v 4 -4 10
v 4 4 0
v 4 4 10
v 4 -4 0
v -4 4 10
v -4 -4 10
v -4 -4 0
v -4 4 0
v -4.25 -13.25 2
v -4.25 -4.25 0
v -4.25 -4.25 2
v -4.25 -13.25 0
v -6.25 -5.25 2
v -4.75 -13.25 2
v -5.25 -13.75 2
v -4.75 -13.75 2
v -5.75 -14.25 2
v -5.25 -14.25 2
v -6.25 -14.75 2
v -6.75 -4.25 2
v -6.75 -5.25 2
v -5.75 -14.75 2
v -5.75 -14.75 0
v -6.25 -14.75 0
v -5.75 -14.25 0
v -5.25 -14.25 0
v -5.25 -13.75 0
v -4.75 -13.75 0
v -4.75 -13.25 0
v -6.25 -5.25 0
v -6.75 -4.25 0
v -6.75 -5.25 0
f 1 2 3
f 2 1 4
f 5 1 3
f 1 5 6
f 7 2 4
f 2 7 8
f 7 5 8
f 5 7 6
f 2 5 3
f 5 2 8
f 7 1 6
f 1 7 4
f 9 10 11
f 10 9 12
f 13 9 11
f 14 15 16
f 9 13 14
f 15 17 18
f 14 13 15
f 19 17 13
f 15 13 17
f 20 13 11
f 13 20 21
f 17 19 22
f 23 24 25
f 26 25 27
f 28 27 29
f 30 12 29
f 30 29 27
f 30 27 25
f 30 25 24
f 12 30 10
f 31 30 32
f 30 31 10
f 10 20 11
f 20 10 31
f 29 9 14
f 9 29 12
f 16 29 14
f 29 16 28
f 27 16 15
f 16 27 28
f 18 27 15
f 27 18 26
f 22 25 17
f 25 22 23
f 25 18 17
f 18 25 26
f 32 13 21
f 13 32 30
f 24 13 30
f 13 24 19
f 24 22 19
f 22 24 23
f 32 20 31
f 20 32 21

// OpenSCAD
translate([0, 0, 5]) color([0,1,0,0.9]) cube([8, 8, 10], center=true);
translate([-4.5, -4.5, 1]) color([1,0,0]) cube([0.5, 0.5, 2], center=true);
translate([-4.5, -5.0, 1]) color([1,0,0]) cube([0.5, 0.5, 2], center=true);
translate([-4.5, -5.5, 1]) color([1,0,0]) cube([0.5, 0.5, 2], center=true);
translate([-4.5, -6.0, 1]) color([1,0,0]) cube([0.5, 0.5, 2], center=true);
translate([-4.5, -6.5, 1]) color([1,0,0]) cube([0.5, 0.5, 2], center=true);
translate([-4.5, -7.0, 1]) color([1,0,0]) cube([0.5, 0.5, 2], center=true);
translate([-4.5, -7.5, 1]) color([1,0,0]) cube([0.5, 0.5, 2], center=true);
translate([-4.5, -8.0, 1]) color([1,0,0]) cube([0.5, 0.5, 2], center=true);
translate([-4.5, -8.5, 1]) color([1,0,0]) cube([0.5, 0.5, 2], center=true);
translate([-4.5, -9.0, 1]) color([1,0,0]) cube([0.5, 0.5, 2], center=true);
translate([-4.5, -9.5, 1]) color([1,0,0]) cube([0.5, 0.5, 2], center=true);
translate([-4.5, -10.0, 1]) color([1,0,0]) cube([0.5, 0.5, 2], center=true);
translate([-4.5, -10.5, 1]) color([1,0,0]) cube([0.5, 0.5, 2], center=true);
translate([-4.5, -11.0, 1]) color([1,0,0]) cube([0.5, 0.5, 2], center=true);
translate([-4.5, -11.5, 1]) color([1,0,0]) cube([0.5, 0.5, 2], center=true);
translate([-4.5, -12.0, 1]) color([1,0,0]) cube([0.5, 0.5, 2], center=true);
translate([-4.5, -12.5, 1]) color([1,0,0]) cube([0.5, 0.5, 2], center=true);
translate([-4.5, -13.0, 1]) color([1,0,0]) cube([0.5, 0.5, 2], center=true);
translate([-5.0, -4.5, 1]) color([1,0,0]) cube([0.5, 0.5, 2], center=true);
translate([-5.0, -5.0, 1]) color([1,0,0]) cube([0.5, 0.5, 2], center=true);
translate([-5.0, -5.5, 1]) color([1,0,0]) cube([0.5, 0.5, 2], center=true);
translate([-5.0, -6.0, 1]) color([1,0,0]) cube([0.5, 0.5, 2], center=true);
translate([-5.0, -6.5, 1]) color([1,0,0]) cube([0.5, 0.5, 2], center=true);
translate([-5.0, -7.0, 1]) color([1,0,0]) cube([0.5, 0.5, 2], center=true);
translate([-5.0, -7.5, 1]) color([1,0,0]) cube([0.5, 0.5, 2], center=true);
translate([-5.0, -8.0, 1]) color([1,0,0]) cube([0.5, 0.5, 2], center=true);
translate([-5.0, -8.5, 1]) color([1,0,0]) cube([0.5, 0.5, 2], center=true);
translate([-5.0, -9.0, 1]) color([1,0,0]) cube([0.5, 0.5, 2], center=true);
translate([-5.0, -9.5, 1]) color([1,0,0]) cube([0.5, 0.5, 2], center=true);
translate([-5.0, -10.0, 1]) color([1,0,0]) cube([0.5, 0.5, 2], center=true);
translate([-5.0, -10.5, 1]) color([1,0,0]) cube([0.5, 0.5, 2], center=true);
translate([-5.0, -11.0, 1]) color([1,0,0]) cube([0.5, 0.5, 2], center=true);
translate([-5.0, -11.5, 1]) color([1,0,0]) cube([0.5, 0.5, 2], center=true);
translate([-5.0, -12.0, 1]) color([1,0,0]) cube([0.5, 0.5, 2], center=true);
translate([-5.0, -12.5, 1]) color([1,0,0]) cube([0.5, 0.5, 2], center=true);
translate([-5.0, -13.0, 1]) color([1,0,0]) cube([0.5, 0.5, 2], center=true);
translate([-5.0, -13.5, 1]) color([1,0,0]) cube([0.5, 0.5, 2], center=true);
translate([-5.5, -4.5, 1]) color([1,0,0]) cube([0.5, 0.5, 2], center=true);
translate([-5.5, -5.0, 1]) color([1,0,0]) cube([0.5, 0.5, 2], center=true);
translate([-5.5, -5.5, 1]) color([1,0,0]) cube([0.5, 0.5, 2], center=true);
translate([-5.5, -6.0, 1]) color([1,0,0]) cube([0.5, 0.5, 2], center=true);
translate([-5.5, -6.5, 1]) color([1,0,0]) cube([0.5, 0.5, 2], center=true);
translate([-5.5, -7.0, 1]) color([1,0,0]) cube([0.5, 0.5, 2], center=true);
translate([-5.5, -7.5, 1]) color([1,0,0]) cube([0.5, 0.5, 2], center=true);
translate([-5.5, -8.0, 1]) color([1,0,0]) cube([0.5, 0.5, 2], center=true);
translate([-5.5, -8.5, 1]) color([1,0,0]) cube([0.5, 0.5, 2], center=true);
translate([-5.5, -9.0, 1]) color([1,0,0]) cube([0.5, 0.5, 2], center=true);
translate([-5.5, -9.5, 1]) color([1,0,0]) cube([0.5, 0.5, 2], center=true);
translate([-5.5, -10.0, 1]) color([1,0,0]) cube([0.5, 0.5, 2], center=true);
translate([-5.5, -10.5, 1]) color([1,0,0]) cube([0.5, 0.5, 2], center=true);
translate([-5.5, -11.0, 1]) color([1,0,0]) cube([0.5, 0.5, 2], center=true);
translate([-5.5, -11.5, 1]) color([1,0,0]) cube([0.5, 0.5, 2], center=true);
translate([-5.5, -12.0, 1]) color([1,0,0]) cube([0.5, 0.5, 2], center=true);
translate([-5.5, -12.5, 1]) color([1,0,0]) cube([0.5, 0.5, 2], center=true);
translate([-5.5, -13.0, 1]) color([1,0,0]) cube([0.5, 0.5, 2], center=true);
translate([-5.5, -13.5, 1]) color([1,0,0]) cube([0.5, 0.5, 2], center=true);
translate([-5.5, -14.0, 1]) color([1,0,0]) cube([0.5, 0.5, 2], center=true);
translate([-6.0, -4.5, 1]) color([1,0,0]) cube([0.5, 0.5, 2], center=true);
translate([-6.0, -5.0, 1]) color([1,0,0]) cube([0.5, 0.5, 2], center=true);
translate([-6.0, -5.5, 1]) color([1,0,0]) cube([0.5, 0.5, 2], center=true);
translate([-6.0, -6.0, 1]) color([1,0,0]) cube([0.5, 0.5, 2], center=true);
translate([-6.0, -6.5, 1]) color([1,0,0]) cube([0.5, 0.5, 2], center=true);
translate([-6.0, -7.0, 1]) color([1,0,0]) cube([0.5, 0.5, 2], center=true);
translate([-6.0, -7.5, 1]) color([1,0,0]) cube([0.5, 0.5, 2], center=true);
translate([-6.0, -8.0, 1]) color([1,0,0]) cube([0.5, 0.5, 2], center=true);
translate([-6.0, -8.5, 1]) color([1,0,0]) cube([0.5, 0.5, 2], center=true);
translate([-6.0, -9.0, 1]) color([1,0,0]) cube([0.5, 0.5, 2], center=true);
translate([-6.0, -9.5, 1]) color([1,0,0]) cube([0.5, 0.5, 2], center=true);
translate([-6.0, -10.0, 1]) color([1,0,0]) cube([0.5, 0.5, 2], center=true);
translate([-6.0, -10.5, 1]) color([1,0,0]) cube([0.5, 0.5, 2], center=true);
translate([-6.0, -11.0, 1]) color([1,0,0]) cube([0.5, 0.5, 2], center=true);
translate([-6.0, -11.5, 1]) color([1,0,0]) cube([0.5, 0.5, 2], center=true);
translate([-6.0, -12.0, 1]) color([1,0,0]) cube([0.5, 0.5, 2], center=true);
translate([-6.0, -12.5, 1]) color([1,0,0]) cube([0.5, 0.5, 2], center=true);
translate([-6.0, -13.0, 1]) color([1,0,0]) cube([0.5, 0.5, 2], center=true);
translate([-6.0, -13.5, 1]) color([1,0,0]) cube([0.5, 0.5, 2], center=true);
translate([-6.0, -14.0, 1]) color([1,0,0]) cube([0.5, 0.5, 2], center=true);
translate([-6.0, -14.5, 1]) color([1,0,0]) cube([0.5, 0.5, 2], center=true);
translate([-6.5, -4.5, 1]) color([1,0,0]) cube([0.5, 0.5, 2], center=true);
translate([-6.5, -5.0, 1]) color([1,0,0]) cube([0.5, 0.5, 2], center=true);
